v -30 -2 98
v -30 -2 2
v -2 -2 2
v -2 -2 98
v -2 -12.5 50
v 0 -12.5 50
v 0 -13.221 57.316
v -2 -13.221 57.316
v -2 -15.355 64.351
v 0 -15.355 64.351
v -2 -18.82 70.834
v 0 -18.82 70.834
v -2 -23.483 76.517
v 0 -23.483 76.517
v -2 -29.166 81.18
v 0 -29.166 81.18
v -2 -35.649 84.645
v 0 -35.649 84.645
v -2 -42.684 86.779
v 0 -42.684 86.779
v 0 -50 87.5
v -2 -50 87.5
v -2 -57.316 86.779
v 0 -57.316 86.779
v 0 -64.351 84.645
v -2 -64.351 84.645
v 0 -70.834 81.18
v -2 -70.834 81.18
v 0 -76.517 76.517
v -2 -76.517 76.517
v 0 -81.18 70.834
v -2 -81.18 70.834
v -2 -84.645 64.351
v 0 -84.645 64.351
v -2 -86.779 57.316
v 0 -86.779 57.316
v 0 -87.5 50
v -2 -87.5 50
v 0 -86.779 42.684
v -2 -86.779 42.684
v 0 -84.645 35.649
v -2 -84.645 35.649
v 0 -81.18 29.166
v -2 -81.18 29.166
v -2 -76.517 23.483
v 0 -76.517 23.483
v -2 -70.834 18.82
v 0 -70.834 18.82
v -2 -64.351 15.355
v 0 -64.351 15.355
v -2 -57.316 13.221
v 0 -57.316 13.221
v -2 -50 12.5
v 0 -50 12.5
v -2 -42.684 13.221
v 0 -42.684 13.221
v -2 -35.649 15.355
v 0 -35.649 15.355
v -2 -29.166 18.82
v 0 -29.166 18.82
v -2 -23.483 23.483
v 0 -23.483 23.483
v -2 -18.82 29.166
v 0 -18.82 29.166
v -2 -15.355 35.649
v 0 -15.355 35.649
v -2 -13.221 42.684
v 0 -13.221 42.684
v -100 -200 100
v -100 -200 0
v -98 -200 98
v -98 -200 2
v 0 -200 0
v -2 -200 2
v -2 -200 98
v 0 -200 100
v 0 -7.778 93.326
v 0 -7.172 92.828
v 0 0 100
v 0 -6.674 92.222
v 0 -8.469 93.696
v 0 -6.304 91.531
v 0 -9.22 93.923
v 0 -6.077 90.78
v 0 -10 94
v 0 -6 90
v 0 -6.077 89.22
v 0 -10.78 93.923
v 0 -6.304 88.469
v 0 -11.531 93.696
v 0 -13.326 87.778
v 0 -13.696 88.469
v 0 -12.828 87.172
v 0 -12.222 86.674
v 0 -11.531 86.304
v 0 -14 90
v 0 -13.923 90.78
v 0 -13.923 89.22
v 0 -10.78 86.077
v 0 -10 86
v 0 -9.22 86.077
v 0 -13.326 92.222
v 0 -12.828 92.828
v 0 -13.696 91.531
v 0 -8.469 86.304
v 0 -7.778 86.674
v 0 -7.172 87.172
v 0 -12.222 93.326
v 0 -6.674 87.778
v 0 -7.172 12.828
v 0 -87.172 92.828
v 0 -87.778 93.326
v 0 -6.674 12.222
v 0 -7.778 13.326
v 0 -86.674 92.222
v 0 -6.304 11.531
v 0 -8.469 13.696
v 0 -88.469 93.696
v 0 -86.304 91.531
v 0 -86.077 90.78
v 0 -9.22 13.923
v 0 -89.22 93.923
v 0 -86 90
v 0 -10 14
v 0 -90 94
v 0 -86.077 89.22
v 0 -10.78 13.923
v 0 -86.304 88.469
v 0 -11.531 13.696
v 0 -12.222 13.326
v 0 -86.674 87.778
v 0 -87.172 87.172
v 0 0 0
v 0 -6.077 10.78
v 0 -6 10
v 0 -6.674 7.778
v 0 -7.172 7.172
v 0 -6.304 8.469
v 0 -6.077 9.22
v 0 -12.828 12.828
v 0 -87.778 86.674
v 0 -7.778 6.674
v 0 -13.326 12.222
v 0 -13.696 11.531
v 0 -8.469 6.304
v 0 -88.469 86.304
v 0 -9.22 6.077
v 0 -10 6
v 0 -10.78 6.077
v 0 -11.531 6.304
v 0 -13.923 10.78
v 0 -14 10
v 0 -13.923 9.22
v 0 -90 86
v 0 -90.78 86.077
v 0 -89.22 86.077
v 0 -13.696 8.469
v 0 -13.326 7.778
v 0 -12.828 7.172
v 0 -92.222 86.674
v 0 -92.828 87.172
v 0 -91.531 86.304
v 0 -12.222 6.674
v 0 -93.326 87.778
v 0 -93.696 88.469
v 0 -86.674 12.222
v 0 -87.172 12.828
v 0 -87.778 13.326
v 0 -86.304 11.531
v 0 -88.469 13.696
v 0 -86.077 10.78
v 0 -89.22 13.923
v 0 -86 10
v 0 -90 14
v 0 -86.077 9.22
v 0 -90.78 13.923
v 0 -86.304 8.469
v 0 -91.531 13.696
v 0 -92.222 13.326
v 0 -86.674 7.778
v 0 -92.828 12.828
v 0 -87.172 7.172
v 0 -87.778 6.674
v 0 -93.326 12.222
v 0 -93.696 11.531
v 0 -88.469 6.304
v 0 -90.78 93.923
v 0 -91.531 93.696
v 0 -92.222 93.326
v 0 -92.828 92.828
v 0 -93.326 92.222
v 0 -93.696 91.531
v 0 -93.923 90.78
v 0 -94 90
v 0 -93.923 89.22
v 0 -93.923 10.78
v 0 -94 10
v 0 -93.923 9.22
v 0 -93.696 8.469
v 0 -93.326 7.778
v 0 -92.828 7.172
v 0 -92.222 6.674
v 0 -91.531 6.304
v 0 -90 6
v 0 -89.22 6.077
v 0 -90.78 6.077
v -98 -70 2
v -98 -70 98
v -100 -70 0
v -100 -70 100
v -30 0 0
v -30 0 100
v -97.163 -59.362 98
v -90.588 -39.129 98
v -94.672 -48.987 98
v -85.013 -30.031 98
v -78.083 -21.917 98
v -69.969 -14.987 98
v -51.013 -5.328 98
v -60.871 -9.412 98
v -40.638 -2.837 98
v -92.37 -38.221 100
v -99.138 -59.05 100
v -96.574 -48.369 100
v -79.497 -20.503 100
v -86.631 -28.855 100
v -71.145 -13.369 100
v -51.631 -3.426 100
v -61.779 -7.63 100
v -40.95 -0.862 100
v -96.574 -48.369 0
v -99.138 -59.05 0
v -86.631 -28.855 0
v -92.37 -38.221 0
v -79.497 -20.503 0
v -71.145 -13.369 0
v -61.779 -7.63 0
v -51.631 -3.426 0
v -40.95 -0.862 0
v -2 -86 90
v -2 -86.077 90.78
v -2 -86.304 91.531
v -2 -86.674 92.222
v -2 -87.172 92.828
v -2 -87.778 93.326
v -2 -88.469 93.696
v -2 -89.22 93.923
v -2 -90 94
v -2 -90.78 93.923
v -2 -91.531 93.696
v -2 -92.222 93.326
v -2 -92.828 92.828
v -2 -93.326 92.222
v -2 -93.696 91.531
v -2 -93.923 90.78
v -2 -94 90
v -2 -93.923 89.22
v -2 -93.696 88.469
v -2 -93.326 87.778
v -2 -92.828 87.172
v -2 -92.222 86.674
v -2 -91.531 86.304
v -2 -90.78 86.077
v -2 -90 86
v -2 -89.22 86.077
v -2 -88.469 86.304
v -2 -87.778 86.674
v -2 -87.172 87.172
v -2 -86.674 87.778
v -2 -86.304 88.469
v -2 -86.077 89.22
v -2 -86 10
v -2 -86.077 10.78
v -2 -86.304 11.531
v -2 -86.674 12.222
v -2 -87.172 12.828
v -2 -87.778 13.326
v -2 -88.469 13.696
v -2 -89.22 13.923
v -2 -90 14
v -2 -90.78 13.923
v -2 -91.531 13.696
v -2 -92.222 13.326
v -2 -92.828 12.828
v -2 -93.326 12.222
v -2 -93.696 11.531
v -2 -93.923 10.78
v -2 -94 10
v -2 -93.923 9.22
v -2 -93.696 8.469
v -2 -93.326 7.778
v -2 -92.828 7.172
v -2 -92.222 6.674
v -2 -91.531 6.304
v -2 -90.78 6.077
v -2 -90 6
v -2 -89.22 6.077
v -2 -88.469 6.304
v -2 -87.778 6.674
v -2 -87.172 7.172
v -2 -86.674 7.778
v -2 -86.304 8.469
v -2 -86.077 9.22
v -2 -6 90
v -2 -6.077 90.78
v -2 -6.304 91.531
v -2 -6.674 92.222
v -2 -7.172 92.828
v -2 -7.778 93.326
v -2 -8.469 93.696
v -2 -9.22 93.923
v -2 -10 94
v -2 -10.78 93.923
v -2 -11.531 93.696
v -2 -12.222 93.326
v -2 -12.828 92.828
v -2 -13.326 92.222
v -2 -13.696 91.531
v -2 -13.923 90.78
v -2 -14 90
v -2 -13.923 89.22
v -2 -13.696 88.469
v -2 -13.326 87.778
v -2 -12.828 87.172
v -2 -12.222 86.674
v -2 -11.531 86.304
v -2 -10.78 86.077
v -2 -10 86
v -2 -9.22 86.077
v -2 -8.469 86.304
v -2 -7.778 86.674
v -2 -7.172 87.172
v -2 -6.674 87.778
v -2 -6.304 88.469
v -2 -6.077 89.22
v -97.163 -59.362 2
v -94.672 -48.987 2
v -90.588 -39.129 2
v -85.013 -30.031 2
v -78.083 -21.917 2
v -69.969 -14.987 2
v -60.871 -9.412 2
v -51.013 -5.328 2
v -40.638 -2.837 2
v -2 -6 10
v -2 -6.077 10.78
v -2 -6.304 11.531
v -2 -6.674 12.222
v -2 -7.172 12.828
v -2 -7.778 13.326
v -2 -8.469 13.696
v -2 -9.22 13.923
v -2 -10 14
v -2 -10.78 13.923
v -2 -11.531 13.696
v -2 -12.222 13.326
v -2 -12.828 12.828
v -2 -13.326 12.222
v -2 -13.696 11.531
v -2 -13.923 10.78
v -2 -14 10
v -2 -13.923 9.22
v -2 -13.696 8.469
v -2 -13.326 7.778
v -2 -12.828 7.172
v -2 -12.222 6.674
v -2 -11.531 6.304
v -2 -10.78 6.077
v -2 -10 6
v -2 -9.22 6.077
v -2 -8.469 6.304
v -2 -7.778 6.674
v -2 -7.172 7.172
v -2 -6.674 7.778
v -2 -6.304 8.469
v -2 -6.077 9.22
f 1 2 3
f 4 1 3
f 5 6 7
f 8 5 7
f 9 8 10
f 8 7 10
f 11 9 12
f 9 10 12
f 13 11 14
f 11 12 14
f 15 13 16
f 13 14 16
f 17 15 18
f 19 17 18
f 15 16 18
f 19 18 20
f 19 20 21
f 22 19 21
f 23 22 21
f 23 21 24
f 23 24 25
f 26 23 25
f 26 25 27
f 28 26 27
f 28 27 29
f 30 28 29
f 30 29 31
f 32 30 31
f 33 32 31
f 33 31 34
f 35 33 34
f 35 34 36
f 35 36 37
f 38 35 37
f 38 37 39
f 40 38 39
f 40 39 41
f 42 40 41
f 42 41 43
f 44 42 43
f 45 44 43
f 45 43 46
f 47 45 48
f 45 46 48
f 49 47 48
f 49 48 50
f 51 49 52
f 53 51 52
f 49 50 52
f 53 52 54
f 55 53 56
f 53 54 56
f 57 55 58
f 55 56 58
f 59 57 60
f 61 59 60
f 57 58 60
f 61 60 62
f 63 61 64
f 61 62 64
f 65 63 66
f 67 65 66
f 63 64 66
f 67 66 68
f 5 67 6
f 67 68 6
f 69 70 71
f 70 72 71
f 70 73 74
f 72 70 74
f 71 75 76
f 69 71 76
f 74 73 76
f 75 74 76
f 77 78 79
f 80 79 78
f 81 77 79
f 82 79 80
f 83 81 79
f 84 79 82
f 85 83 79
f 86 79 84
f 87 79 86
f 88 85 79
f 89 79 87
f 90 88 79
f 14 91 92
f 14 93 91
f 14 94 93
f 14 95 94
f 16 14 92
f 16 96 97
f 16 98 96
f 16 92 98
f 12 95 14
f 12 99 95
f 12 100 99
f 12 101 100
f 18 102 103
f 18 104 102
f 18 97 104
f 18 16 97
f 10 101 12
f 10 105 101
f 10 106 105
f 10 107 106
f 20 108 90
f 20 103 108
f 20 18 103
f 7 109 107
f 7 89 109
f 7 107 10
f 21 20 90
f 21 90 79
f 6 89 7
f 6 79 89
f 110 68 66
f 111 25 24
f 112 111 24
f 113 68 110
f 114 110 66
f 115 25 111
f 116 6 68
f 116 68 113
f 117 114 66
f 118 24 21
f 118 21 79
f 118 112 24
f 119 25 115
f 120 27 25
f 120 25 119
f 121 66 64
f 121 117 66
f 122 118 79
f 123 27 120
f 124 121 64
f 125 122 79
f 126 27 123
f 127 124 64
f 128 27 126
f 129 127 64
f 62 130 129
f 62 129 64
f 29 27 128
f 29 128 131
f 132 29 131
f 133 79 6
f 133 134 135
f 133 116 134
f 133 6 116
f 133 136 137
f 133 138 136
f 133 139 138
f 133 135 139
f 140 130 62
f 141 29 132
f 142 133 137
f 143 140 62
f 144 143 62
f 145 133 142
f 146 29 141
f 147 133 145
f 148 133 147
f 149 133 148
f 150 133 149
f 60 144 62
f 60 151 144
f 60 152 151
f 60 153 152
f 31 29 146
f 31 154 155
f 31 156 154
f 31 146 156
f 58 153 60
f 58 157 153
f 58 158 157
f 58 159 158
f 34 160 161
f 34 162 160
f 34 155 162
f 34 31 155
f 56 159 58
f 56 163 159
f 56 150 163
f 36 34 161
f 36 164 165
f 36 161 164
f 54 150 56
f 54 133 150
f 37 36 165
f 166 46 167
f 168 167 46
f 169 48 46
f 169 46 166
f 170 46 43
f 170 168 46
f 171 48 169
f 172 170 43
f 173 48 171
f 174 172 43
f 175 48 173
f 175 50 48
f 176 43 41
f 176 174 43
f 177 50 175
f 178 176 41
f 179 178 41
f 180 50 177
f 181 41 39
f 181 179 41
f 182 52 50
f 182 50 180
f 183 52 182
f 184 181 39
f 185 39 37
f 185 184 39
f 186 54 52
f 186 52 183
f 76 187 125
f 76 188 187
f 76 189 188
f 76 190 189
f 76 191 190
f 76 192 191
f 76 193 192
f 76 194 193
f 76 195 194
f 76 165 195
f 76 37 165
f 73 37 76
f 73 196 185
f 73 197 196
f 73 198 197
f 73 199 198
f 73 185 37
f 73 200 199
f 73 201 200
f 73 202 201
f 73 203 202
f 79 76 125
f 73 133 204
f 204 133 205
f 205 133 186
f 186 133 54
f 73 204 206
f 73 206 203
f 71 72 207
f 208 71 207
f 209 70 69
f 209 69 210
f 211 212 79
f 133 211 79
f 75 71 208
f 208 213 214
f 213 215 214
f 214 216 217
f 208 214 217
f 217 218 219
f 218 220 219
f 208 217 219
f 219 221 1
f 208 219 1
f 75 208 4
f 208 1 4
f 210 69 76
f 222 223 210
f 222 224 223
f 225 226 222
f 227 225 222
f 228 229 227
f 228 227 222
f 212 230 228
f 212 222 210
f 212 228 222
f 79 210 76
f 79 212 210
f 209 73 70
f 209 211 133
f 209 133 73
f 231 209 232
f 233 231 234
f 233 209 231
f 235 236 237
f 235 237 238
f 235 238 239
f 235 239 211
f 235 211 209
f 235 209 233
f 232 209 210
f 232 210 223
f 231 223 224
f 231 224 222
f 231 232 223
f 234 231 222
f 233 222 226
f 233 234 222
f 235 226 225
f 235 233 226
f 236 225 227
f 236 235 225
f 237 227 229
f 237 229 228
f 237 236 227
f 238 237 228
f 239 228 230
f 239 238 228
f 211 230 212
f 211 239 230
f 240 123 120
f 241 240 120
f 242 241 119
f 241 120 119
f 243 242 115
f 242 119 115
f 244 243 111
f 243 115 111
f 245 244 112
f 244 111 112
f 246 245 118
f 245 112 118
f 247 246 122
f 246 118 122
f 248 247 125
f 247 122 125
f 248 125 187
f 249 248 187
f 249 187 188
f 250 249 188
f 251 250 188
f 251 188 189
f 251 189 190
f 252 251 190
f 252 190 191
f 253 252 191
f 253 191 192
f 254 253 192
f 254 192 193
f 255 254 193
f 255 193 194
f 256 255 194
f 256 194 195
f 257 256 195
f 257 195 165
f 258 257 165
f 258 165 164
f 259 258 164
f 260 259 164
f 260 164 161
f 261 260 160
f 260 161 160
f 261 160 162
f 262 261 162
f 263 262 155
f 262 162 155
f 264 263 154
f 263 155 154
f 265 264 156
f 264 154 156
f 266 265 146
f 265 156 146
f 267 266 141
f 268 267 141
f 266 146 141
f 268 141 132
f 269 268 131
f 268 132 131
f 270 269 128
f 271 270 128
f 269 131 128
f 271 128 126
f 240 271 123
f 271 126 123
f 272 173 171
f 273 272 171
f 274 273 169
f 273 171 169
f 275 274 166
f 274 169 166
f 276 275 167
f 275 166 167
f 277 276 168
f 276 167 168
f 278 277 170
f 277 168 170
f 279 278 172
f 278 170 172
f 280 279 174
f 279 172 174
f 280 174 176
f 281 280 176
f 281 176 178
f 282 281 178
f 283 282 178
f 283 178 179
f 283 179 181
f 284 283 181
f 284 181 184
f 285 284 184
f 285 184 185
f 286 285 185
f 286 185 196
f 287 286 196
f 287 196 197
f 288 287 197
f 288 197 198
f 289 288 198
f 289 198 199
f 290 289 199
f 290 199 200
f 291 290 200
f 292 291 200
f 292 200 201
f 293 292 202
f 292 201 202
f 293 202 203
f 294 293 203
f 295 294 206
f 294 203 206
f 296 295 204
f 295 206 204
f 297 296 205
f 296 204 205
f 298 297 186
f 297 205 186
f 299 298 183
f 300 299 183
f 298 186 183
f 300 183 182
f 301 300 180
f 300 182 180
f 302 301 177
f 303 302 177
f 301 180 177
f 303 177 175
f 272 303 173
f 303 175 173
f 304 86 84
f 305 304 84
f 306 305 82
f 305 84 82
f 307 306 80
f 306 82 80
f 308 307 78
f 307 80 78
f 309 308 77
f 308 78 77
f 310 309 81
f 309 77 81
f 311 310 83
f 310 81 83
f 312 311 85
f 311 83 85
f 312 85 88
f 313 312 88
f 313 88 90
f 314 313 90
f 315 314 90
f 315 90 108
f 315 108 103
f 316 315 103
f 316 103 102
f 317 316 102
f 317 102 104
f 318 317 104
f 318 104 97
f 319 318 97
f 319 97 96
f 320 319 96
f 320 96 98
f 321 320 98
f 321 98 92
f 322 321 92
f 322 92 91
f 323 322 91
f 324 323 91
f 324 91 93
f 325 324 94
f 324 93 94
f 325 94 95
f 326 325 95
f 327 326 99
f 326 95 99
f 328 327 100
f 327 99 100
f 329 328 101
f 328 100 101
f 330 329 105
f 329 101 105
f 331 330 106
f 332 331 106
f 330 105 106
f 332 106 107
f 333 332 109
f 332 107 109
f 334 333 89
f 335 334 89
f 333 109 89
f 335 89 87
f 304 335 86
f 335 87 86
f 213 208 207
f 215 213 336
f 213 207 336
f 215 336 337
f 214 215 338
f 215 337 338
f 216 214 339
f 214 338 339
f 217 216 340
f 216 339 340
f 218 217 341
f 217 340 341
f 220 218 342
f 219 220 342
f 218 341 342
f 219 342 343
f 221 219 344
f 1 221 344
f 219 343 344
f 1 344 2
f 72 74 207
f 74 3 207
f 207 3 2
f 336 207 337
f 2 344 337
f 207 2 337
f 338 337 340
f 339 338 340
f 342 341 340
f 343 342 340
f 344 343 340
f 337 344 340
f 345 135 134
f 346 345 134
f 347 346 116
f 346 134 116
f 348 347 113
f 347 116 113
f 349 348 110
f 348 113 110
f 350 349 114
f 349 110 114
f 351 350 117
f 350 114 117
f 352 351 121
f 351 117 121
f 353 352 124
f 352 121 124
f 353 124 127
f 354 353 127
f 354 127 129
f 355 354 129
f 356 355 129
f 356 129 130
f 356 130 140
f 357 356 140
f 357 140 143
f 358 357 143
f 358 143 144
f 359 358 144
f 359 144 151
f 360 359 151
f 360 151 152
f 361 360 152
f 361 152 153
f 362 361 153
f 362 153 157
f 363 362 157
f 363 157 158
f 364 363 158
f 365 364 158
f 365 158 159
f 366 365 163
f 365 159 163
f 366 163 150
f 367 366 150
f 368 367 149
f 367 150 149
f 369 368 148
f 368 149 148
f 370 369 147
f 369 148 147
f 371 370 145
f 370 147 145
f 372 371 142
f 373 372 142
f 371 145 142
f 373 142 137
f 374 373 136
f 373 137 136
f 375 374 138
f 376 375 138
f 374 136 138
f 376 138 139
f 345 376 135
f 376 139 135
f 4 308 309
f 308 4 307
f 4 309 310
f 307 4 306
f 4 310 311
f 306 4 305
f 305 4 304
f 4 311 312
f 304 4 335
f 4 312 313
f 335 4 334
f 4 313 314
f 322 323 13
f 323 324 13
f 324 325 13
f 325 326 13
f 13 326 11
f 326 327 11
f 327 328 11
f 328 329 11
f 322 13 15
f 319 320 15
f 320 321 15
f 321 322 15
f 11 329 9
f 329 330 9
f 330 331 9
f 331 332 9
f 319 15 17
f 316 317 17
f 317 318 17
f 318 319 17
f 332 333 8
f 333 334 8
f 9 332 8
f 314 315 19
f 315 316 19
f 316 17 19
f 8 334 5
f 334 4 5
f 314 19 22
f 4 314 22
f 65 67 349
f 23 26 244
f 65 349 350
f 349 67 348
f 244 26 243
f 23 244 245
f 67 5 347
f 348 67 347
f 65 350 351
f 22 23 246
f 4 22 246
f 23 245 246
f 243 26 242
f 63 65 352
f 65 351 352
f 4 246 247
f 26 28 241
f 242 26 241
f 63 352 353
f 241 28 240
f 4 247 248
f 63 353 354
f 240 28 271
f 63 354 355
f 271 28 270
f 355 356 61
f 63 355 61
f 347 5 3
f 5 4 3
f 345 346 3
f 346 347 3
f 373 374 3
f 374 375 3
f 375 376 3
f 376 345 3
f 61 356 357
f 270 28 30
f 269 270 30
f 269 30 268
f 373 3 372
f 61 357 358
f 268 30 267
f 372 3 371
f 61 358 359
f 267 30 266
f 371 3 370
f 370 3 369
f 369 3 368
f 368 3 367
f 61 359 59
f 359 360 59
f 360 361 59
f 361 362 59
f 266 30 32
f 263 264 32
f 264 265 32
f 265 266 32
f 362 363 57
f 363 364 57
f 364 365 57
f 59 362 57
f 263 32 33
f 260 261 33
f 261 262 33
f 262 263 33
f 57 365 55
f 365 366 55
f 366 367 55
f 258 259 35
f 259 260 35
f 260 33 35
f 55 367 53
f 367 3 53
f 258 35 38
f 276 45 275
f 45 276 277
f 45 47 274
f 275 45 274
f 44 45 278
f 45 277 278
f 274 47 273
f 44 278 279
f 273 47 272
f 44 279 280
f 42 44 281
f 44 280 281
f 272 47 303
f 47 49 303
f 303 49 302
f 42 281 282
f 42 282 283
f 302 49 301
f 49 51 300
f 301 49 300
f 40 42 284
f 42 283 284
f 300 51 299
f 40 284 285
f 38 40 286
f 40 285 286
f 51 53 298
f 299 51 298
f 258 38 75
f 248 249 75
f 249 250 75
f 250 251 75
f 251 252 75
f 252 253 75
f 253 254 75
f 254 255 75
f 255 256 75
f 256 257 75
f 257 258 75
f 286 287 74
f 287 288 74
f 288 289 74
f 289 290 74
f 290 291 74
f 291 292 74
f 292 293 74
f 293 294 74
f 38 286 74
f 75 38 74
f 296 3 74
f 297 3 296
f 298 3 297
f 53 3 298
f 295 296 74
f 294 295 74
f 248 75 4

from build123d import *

# Parameters (mm, degrees)
SUPERFICIE_EXTRUIR1_2_DEPTH = 100
DAR_ESPESOR1_T2             = 2
CROQUIS4_R                  = 37.5
CROQUIS4_R_2                = 4
EXTRUIR3_DEPTH              = 11


with BuildPart() as body_1:
    # Superficie-Extruir1: a surface, the sketch's curves swept straight by 100 mm
    with BuildLine(Plane.XY, mode=Mode.PRIVATE) as superficie_extruir1_2_path:
        Line((-100, -200), (-100, -70))
        ThreePointArc((-100, -70), (-79.497474683, -20.502525317), (-30, 0))
        Line((-30, 0), (0, 0))
        Line((0, 0), (0, -200))
    superficie_extruir1_2 = Shell.extrude(superficie_extruir1_2_path.wire(), (0 * SUPERFICIE_EXTRUIR1_2_DEPTH, 0 * SUPERFICIE_EXTRUIR1_2_DEPTH, 1 * SUPERFICIE_EXTRUIR1_2_DEPTH))
    # Croquis5 → Superficie-Plano1: a flat surface bounded by the sketch
    with BuildSketch(Plane(origin=(0, 0, 100), x_dir=(-1, 0, 0), z_dir=(0, 0, -1)), mode=Mode.PRIVATE) as superficie_plano1_3_region:
        with BuildLine():
            Line((100, -200), (0, -200))
            Line((0, -200), (0, 0))
            Line((0, 0), (30, 0))
            ThreePointArc((30, 0), (79.497474683, -20.502525317), (100, -70))
            Line((100, -70), (100, -200))
        make_face()
    superficie_plano1_3 = superficie_plano1_3_region.sketch.faces()[0]
    # Croquis6 → Superficie-Plano2: a flat surface bounded by the sketch
    with BuildSketch(Plane(origin=(0, 0, 0), x_dir=(-1, 0, 0), z_dir=(0, 0, -1)), mode=Mode.PRIVATE) as superficie_plano2_4_region:
        with BuildLine():
            Line((0, -200), (100, -200))
            Line((100, -200), (100, -70))
            ThreePointArc((100, -70), (79.497474683, -20.502525317), (30, 0))
            Line((30, 0), (0, 0))
            Line((0, 0), (0, -200))
        make_face()
    superficie_plano2_4 = superficie_plano2_4_region.sketch.faces()[0]
    # Superficie-Coser1: the surfaces knitted into one
    superficie_coser1_1 = Shell(Face.sew_faces(superficie_extruir1_2.faces() + superficie_plano1_3.faces() + superficie_plano2_4.faces())[0])
    add(Solid.thicken(superficie_coser1_1, -DAR_ESPESOR1_T2))

    # Croquis4 → Extruir3 (cut)
    with BuildSketch(Plane(origin=(0, 0, 0), x_dir=(0, 0, -1), z_dir=(1, 0, 0))):
        with Locations(Location((-50, -50, 0), (0, 0, 90))):
            Circle(CROQUIS4_R)
        with Locations(Location((-90, -10, 0), (0, 0, 90))):
            Circle(CROQUIS4_R_2)
        with Locations(Location((-10, -10, 0), (0, 0, 90))):
            Circle(CROQUIS4_R_2)
        with Locations(Location((-10, -90, 0), (0, 0, 90))):
            Circle(CROQUIS4_R_2)
        with Locations(Location((-90, -90, 0), (0, 0, 90))):
            Circle(CROQUIS4_R_2)
    extrude(amount=-EXTRUIR3_DEPTH, mode=Mode.SUBTRACT)


solid = body_1.part
